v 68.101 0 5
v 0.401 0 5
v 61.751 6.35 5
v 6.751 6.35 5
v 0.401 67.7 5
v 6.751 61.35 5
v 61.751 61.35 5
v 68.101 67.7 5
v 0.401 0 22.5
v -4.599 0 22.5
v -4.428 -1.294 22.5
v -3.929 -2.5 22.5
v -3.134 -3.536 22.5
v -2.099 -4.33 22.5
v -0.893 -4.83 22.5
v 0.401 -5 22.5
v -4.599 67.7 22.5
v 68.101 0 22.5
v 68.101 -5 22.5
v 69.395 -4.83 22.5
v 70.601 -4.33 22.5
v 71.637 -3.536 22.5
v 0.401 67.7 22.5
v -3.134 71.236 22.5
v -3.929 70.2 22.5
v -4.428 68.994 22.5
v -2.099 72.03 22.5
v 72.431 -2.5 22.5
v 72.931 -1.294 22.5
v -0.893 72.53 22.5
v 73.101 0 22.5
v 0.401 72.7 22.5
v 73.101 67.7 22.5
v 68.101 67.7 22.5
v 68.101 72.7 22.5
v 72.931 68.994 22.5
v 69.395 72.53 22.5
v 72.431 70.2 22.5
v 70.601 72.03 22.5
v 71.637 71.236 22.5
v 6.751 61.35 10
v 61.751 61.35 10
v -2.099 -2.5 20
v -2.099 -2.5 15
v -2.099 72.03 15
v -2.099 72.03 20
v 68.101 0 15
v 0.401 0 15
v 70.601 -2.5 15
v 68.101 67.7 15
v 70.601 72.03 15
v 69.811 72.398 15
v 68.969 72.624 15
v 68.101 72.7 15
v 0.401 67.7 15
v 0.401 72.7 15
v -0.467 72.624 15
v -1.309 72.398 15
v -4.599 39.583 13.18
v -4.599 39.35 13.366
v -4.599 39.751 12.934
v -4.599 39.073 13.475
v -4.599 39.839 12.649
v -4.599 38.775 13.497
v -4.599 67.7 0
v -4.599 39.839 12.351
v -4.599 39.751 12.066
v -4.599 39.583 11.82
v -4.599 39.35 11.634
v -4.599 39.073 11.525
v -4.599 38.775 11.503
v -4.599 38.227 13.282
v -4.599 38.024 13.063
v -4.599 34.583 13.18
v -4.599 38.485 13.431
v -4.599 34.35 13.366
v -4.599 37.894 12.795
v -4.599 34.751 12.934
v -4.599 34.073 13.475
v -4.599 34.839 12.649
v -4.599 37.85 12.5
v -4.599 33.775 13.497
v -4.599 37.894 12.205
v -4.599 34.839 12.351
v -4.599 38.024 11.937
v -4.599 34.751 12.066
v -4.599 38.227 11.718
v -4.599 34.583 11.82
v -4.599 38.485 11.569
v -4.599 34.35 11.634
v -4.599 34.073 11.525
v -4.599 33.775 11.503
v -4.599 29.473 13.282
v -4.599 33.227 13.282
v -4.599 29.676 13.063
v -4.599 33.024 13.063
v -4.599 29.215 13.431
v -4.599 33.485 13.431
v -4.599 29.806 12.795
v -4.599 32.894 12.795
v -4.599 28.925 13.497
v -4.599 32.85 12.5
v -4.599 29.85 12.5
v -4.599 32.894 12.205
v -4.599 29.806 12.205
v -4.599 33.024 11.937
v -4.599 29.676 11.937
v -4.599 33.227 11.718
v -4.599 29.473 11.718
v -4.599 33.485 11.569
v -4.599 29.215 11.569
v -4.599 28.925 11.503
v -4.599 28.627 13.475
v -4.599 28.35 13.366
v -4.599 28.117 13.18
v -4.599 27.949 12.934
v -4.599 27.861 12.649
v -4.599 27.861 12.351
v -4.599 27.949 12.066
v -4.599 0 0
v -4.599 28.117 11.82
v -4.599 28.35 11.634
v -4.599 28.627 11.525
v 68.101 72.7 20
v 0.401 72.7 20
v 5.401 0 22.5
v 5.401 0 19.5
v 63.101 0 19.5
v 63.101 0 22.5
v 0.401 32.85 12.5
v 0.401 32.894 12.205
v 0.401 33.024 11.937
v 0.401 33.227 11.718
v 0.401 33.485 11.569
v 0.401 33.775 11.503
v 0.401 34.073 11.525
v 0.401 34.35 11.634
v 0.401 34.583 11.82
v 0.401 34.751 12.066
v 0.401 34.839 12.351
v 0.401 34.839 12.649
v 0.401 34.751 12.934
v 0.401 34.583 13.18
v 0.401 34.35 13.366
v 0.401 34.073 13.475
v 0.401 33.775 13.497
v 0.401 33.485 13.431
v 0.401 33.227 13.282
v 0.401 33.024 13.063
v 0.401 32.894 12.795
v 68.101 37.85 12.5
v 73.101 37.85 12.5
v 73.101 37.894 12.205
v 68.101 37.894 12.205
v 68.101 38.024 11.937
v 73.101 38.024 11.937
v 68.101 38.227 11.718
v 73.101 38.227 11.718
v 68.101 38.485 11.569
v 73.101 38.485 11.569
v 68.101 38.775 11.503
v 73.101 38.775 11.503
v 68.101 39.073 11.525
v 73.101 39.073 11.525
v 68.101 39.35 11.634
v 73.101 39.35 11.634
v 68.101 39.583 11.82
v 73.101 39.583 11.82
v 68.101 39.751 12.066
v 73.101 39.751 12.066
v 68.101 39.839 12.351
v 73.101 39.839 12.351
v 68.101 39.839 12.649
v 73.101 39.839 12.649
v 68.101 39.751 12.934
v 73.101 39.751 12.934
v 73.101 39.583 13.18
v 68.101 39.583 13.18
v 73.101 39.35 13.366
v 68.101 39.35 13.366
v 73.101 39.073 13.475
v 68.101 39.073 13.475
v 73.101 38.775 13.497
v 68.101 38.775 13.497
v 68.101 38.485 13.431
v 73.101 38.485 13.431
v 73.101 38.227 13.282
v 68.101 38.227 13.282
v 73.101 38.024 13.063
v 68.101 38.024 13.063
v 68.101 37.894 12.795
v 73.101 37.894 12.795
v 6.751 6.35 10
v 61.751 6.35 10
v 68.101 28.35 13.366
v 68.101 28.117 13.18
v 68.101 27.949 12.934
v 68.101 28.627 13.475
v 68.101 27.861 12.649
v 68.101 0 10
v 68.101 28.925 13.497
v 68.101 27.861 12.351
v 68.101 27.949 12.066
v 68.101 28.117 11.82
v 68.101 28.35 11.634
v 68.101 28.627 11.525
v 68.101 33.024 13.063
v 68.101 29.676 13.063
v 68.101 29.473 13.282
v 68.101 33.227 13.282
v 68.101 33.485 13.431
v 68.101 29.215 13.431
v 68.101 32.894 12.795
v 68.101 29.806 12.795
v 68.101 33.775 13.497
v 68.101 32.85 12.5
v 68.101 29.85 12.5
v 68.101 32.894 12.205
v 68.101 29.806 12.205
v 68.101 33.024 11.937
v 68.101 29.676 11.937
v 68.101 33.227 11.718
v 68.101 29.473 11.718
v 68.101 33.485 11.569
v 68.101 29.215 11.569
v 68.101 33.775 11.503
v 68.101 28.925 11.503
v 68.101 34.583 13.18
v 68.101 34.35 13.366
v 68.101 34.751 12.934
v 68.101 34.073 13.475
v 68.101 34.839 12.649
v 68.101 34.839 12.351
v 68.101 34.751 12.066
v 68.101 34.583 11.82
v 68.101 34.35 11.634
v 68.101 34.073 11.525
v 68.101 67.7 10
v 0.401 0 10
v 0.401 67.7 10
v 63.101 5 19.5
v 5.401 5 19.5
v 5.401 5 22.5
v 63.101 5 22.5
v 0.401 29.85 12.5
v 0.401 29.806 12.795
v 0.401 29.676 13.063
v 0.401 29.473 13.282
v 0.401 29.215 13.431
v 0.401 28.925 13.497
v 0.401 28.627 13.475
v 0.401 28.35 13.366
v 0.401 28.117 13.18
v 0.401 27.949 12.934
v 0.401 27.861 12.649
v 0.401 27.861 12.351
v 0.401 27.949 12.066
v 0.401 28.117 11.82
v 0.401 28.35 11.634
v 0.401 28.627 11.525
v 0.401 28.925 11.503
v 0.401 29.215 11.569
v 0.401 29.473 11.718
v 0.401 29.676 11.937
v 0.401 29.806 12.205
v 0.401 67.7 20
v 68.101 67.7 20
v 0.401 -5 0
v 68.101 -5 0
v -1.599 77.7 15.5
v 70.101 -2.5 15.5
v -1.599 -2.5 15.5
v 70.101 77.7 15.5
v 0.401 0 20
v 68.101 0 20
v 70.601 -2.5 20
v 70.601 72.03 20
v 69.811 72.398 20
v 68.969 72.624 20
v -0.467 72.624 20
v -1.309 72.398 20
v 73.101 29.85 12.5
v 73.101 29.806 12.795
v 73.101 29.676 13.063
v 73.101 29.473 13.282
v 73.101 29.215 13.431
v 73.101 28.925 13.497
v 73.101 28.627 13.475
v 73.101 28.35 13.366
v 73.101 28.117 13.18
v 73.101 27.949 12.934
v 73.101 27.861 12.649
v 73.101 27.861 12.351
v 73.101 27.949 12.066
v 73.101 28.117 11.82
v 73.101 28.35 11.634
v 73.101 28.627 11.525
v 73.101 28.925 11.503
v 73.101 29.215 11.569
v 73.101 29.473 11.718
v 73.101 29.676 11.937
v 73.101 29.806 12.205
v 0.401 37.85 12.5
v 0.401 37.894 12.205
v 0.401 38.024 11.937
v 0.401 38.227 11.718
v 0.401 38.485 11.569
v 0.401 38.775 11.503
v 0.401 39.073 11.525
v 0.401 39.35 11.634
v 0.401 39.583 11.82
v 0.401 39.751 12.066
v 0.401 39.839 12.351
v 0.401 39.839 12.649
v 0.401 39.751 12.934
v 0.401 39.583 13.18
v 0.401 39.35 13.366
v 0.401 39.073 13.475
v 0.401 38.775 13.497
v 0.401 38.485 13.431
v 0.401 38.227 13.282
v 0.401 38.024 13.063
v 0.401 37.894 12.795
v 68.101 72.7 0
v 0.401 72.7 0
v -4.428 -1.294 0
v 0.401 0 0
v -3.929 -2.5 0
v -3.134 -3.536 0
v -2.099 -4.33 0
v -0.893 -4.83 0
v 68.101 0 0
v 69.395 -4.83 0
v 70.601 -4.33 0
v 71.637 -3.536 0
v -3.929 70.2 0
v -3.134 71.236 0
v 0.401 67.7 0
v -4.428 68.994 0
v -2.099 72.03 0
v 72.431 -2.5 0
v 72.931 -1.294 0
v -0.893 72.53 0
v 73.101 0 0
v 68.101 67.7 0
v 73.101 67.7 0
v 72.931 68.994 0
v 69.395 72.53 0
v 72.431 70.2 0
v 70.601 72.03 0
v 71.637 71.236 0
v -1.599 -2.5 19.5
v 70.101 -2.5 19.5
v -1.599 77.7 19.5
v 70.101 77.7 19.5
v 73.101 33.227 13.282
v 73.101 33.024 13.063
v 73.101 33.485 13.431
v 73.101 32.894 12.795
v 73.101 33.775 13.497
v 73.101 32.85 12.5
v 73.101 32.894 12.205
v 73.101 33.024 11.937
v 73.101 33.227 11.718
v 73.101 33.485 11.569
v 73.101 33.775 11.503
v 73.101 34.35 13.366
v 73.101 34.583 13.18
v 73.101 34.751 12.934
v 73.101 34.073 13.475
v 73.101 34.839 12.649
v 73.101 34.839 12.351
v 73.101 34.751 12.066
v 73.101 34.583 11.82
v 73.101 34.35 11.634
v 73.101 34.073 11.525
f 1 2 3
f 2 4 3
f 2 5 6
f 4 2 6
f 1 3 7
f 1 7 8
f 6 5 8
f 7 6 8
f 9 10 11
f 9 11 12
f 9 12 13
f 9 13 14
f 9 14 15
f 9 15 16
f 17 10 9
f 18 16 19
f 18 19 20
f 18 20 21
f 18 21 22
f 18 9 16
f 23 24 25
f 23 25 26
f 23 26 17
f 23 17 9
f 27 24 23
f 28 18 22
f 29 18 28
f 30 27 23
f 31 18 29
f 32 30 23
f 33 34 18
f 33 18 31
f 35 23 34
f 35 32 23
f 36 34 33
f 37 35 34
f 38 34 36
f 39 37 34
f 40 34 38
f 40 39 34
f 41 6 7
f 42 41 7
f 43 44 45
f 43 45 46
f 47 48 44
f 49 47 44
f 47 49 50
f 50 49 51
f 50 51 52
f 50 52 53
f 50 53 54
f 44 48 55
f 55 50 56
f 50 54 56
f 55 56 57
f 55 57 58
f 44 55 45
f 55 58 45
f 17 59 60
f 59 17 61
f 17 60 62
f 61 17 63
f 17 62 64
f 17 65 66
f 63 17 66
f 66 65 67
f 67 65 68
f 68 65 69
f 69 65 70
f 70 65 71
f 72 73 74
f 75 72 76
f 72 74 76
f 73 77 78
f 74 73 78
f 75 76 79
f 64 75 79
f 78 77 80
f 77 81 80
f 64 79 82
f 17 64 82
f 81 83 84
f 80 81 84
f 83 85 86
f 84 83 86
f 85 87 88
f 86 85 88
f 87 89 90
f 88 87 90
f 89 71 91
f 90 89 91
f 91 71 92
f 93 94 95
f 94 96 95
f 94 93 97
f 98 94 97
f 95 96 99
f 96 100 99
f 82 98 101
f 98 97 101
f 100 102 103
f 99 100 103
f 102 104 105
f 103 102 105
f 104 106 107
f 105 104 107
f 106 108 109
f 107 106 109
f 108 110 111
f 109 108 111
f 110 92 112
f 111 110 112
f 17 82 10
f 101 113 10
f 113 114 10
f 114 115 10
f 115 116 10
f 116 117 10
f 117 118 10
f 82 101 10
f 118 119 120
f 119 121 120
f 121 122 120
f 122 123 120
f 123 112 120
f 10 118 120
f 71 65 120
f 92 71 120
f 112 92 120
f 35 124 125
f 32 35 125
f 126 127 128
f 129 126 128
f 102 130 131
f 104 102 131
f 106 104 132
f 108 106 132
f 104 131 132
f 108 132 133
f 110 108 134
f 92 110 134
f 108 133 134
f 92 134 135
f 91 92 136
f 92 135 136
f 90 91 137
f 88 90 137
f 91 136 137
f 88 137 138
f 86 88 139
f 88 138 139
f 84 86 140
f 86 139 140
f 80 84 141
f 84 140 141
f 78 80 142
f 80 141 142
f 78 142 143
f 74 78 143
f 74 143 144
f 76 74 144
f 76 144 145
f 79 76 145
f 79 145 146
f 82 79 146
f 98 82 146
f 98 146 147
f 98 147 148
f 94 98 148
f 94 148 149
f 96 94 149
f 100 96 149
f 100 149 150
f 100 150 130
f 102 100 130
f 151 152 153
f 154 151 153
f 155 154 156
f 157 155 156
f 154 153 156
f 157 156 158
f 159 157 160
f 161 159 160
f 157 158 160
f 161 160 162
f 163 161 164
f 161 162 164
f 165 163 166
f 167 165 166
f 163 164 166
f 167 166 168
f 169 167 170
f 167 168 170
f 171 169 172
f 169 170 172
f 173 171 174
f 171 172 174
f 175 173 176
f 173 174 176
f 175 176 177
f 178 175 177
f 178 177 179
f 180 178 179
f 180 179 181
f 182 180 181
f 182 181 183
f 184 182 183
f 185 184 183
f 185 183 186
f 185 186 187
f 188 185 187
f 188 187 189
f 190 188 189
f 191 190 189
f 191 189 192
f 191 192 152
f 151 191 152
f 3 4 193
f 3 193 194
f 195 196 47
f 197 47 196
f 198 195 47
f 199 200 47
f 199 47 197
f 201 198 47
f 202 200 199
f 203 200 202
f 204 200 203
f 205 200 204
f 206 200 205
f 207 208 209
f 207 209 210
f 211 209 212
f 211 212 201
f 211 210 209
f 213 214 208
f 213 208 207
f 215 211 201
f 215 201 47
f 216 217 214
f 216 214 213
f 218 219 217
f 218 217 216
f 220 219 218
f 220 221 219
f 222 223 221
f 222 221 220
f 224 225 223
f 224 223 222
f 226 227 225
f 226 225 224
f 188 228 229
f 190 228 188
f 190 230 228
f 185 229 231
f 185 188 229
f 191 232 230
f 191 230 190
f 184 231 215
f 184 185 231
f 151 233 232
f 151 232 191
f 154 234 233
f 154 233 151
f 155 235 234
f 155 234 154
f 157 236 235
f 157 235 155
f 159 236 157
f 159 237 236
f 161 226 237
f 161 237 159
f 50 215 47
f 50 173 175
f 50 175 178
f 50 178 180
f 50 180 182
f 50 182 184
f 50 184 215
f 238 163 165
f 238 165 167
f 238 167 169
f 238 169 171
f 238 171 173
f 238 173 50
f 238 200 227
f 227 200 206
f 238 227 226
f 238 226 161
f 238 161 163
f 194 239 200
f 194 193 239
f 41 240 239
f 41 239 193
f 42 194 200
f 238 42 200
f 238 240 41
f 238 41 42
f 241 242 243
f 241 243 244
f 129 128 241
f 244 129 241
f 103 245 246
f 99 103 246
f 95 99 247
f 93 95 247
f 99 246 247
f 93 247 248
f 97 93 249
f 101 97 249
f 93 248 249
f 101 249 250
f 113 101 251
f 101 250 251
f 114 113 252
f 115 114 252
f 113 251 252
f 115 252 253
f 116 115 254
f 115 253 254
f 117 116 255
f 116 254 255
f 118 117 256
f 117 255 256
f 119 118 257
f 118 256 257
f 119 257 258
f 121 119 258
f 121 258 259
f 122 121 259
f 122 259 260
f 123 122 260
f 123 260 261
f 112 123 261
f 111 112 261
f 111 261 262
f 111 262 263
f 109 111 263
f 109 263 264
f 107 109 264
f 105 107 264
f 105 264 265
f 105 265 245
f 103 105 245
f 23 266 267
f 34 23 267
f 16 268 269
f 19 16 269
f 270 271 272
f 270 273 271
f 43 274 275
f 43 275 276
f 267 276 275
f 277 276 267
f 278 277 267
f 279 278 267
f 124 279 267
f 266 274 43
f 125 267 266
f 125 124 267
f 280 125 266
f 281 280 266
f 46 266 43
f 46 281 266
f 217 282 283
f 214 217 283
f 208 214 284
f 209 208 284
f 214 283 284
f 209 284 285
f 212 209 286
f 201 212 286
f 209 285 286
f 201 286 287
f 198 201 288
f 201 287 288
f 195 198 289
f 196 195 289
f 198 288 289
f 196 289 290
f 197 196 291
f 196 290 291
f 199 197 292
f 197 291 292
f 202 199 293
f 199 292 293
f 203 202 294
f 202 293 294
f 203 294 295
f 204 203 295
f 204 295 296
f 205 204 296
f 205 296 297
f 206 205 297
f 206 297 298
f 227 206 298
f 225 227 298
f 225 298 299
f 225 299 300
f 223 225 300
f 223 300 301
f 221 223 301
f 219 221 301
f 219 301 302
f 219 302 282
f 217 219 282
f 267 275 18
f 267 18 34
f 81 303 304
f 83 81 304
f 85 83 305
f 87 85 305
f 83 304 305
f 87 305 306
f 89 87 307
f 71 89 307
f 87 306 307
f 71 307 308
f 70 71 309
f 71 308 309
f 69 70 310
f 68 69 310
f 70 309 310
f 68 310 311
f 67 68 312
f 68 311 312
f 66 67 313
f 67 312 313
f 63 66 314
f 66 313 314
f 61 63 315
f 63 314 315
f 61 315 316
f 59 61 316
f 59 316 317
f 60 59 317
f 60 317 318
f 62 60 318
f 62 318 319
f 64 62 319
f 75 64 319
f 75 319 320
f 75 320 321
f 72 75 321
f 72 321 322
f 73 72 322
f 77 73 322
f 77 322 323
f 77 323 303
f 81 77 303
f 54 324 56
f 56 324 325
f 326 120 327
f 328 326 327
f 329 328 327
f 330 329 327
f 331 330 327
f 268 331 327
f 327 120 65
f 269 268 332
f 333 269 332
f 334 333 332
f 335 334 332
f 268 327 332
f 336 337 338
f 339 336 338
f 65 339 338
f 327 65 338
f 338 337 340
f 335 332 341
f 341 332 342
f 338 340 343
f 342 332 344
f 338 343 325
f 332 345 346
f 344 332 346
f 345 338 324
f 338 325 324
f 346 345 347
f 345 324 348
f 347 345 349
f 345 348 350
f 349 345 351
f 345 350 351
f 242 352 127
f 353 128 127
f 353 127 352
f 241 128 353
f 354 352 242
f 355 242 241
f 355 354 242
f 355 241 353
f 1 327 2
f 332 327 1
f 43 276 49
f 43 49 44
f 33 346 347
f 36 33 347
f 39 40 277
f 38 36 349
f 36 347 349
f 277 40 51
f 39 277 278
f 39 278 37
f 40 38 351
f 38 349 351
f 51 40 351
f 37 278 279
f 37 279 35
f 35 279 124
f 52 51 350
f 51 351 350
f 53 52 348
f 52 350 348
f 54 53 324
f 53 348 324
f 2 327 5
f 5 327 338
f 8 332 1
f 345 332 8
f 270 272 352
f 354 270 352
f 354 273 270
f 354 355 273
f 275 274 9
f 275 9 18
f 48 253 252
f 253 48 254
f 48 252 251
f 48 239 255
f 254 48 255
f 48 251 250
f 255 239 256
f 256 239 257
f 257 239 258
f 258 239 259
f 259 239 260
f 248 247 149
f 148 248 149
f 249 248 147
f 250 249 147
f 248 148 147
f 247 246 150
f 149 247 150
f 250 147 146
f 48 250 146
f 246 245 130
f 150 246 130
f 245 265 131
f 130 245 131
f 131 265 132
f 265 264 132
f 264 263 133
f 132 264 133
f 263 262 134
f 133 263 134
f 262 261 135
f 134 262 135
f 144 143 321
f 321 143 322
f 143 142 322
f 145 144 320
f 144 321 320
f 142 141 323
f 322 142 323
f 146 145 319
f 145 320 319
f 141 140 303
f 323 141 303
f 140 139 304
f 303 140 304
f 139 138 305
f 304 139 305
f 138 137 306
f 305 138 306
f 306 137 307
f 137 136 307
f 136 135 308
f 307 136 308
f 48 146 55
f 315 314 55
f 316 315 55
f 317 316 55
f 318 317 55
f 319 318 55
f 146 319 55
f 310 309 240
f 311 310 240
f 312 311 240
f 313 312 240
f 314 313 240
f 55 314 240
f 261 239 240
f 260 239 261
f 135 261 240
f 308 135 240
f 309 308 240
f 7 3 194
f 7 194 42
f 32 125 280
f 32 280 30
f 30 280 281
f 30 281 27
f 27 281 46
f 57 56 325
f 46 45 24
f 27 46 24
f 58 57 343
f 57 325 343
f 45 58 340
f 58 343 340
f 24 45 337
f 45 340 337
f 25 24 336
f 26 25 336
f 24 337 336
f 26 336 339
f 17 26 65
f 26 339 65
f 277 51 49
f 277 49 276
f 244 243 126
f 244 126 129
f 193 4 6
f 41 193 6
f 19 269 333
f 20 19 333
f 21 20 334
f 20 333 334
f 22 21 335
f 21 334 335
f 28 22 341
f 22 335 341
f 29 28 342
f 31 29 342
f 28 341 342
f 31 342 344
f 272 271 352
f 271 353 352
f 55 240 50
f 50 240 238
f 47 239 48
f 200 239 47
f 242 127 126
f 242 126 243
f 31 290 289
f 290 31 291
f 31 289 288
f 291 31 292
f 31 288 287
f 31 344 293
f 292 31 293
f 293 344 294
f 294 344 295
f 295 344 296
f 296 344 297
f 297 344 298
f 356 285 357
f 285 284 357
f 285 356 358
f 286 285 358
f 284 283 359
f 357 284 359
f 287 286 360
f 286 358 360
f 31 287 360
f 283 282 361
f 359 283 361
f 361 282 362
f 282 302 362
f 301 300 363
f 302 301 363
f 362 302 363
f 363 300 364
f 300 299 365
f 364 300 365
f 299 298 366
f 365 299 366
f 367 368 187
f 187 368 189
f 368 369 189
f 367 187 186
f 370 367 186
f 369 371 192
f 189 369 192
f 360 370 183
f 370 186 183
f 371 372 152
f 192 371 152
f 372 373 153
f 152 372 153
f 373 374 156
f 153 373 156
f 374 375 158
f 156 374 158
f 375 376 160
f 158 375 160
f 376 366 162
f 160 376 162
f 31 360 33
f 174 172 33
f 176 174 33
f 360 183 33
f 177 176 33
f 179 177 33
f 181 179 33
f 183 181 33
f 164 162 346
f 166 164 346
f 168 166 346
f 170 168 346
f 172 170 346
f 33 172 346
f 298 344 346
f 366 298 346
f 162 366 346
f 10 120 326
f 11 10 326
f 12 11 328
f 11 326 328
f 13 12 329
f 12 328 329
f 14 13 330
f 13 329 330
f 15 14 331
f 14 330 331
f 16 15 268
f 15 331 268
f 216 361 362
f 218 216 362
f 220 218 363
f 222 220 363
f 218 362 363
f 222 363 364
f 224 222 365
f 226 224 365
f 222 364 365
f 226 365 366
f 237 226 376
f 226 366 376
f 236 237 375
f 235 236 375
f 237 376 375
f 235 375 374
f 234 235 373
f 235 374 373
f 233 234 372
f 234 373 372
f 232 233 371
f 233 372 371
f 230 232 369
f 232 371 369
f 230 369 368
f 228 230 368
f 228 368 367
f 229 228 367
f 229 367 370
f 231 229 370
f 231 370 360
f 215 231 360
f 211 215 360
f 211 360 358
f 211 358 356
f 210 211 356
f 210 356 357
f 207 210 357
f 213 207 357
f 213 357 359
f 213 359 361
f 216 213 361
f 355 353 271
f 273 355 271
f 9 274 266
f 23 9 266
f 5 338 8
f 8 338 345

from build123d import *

# Parameters (mm, degrees)
F0_W           = 67.7
F0_H           = 67.7
F1_DEPTH       = 22.5
F3_START       = 5
F2_W           = 67.7
F2_H           = 67.7
F2_W_2         = 55
F2_H_2         = 55
F3_DEPTH       = 5
F6_DEPTH       = 100
F7_W           = 72.7
F7_H           = 5
F8_DEPTH       = 75.2
F10_DEPTH      = 5
F10_DEPTH_BACK = 75.2
F11_W          = 57.7
F11_H          = 5
F12_DEPTH      = 3


with BuildPart() as f1:
    # F0 (on Top) → F1 (new body)
    with BuildSketch(Plane.XY):
        with BuildLine():
            Line((68.1011751294, 72.7), (0.4011751294, 72.7))
            ThreePointArc((0.4011751294, 72.7), (-3.1343587765, 71.2355339059), (-4.5988248706, 67.7))
            Line((-4.5988248706, 67.7), (-4.5988248706, 0))
            ThreePointArc((-4.5988248706, 0), (-3.1343587765, -3.5355339059), (0.4011751294, -5))
            Line((0.4011751294, -5), (68.1011751294, -5))
            ThreePointArc((68.1011751294, -5), (71.6367090353, -3.5355339059), (73.1011751294, 0))
            Line((73.1011751294, 0), (73.1011751294, 67.7))
            ThreePointArc((73.1011751294, 67.7), (71.6367090353, 71.2355339059), (68.1011751294, 72.7))
        make_face()
        with Locations((34.2511751294, 33.85)):
            Rectangle(F0_W, F0_H, mode=Mode.SUBTRACT)
    extrude(amount=F1_DEPTH)

    # F2 (on Top) → F3 (join)
    with BuildSketch(Plane.XY.offset(F3_START)):
        with Locations((34.2511751294, 33.85)):
            Rectangle(F2_W, F2_H)
        with Locations((34.2511751294, 33.85)):
            Rectangle(F2_W_2, F2_H_2, mode=Mode.SUBTRACT)
    extrude(amount=F3_DEPTH)

    # F5 (on face) → F6 (cut)
    with BuildSketch(Plane.YZ.offset(73.1011751294)):
        with BuildLine():
            Line((32.85, 12.5), (34.85, 12.5))
            ThreePointArc((34.85, 12.5), (33.85, 13.5), (32.85, 12.5))
        make_face()
        with BuildLine():
            ThreePointArc((27.85, 12.5), (28.85, 11.5), (29.85, 12.5))
            Line((29.85, 12.5), (27.85, 12.5))
        make_face()
        with BuildLine():
            Line((27.85, 12.5), (29.85, 12.5))
            ThreePointArc((29.85, 12.5), (28.85, 13.5), (27.85, 12.5))
        make_face()
        with BuildLine():
            ThreePointArc((32.85, 12.5), (33.85, 11.5), (34.85, 12.5))
            Line((34.85, 12.5), (32.85, 12.5))
        make_face()
        with BuildLine():
            ThreePointArc((39.85, 12.5), (38.85, 13.5), (37.85, 12.5))
            Line((37.85, 12.5), (39.85, 12.5))
        make_face()
        with BuildLine():
            Line((39.85, 12.5), (37.85, 12.5))
            ThreePointArc((37.85, 12.5), (38.85, 11.5), (39.85, 12.5))
        make_face()
    extrude(amount=-F6_DEPTH, mode=Mode.SUBTRACT)

    # F7 (on face) → F8 (cut)
    with BuildSketch(Plane(origin=(0, 72.7, 0), x_dir=(-1, 0, 0), z_dir=(0, 1, 0))):
        with Locations((-34.2511751294, 17.5)):
            Rectangle(F7_W, F7_H)
    extrude(amount=-F8_DEPTH, mode=Mode.SUBTRACT)


with BuildPart() as f10:
    # F9 (on face) → F10 (new body, two sides)
    with BuildSketch(Plane(origin=(0, 72.7, 0), x_dir=(-1, 0, 0), z_dir=(0, 1, 0))) as f10_sk:
        Polygon((-70.1011751294, 15.5), (-68.1011751294, 15.5), (-0.4011751294, 15.5), (1.5988248706, 15.5), (1.5988248706, 19.5), (-0.4011751294, 19.5), (-68.1011751294, 19.5), (-70.1011751294, 19.5), align=None)
    extrude(amount=F10_DEPTH)
    extrude(f10_sk.sketch, amount=-F10_DEPTH_BACK)

    # F11 (on face) → F12 (join)
    with BuildSketch(Plane.XY.offset(19.5)):
        with Locations((34.2511751294, 2.5)):
            Rectangle(F11_W, F11_H)
    extrude(amount=F12_DEPTH)


solid = Compound([f1.part, f10.part])
